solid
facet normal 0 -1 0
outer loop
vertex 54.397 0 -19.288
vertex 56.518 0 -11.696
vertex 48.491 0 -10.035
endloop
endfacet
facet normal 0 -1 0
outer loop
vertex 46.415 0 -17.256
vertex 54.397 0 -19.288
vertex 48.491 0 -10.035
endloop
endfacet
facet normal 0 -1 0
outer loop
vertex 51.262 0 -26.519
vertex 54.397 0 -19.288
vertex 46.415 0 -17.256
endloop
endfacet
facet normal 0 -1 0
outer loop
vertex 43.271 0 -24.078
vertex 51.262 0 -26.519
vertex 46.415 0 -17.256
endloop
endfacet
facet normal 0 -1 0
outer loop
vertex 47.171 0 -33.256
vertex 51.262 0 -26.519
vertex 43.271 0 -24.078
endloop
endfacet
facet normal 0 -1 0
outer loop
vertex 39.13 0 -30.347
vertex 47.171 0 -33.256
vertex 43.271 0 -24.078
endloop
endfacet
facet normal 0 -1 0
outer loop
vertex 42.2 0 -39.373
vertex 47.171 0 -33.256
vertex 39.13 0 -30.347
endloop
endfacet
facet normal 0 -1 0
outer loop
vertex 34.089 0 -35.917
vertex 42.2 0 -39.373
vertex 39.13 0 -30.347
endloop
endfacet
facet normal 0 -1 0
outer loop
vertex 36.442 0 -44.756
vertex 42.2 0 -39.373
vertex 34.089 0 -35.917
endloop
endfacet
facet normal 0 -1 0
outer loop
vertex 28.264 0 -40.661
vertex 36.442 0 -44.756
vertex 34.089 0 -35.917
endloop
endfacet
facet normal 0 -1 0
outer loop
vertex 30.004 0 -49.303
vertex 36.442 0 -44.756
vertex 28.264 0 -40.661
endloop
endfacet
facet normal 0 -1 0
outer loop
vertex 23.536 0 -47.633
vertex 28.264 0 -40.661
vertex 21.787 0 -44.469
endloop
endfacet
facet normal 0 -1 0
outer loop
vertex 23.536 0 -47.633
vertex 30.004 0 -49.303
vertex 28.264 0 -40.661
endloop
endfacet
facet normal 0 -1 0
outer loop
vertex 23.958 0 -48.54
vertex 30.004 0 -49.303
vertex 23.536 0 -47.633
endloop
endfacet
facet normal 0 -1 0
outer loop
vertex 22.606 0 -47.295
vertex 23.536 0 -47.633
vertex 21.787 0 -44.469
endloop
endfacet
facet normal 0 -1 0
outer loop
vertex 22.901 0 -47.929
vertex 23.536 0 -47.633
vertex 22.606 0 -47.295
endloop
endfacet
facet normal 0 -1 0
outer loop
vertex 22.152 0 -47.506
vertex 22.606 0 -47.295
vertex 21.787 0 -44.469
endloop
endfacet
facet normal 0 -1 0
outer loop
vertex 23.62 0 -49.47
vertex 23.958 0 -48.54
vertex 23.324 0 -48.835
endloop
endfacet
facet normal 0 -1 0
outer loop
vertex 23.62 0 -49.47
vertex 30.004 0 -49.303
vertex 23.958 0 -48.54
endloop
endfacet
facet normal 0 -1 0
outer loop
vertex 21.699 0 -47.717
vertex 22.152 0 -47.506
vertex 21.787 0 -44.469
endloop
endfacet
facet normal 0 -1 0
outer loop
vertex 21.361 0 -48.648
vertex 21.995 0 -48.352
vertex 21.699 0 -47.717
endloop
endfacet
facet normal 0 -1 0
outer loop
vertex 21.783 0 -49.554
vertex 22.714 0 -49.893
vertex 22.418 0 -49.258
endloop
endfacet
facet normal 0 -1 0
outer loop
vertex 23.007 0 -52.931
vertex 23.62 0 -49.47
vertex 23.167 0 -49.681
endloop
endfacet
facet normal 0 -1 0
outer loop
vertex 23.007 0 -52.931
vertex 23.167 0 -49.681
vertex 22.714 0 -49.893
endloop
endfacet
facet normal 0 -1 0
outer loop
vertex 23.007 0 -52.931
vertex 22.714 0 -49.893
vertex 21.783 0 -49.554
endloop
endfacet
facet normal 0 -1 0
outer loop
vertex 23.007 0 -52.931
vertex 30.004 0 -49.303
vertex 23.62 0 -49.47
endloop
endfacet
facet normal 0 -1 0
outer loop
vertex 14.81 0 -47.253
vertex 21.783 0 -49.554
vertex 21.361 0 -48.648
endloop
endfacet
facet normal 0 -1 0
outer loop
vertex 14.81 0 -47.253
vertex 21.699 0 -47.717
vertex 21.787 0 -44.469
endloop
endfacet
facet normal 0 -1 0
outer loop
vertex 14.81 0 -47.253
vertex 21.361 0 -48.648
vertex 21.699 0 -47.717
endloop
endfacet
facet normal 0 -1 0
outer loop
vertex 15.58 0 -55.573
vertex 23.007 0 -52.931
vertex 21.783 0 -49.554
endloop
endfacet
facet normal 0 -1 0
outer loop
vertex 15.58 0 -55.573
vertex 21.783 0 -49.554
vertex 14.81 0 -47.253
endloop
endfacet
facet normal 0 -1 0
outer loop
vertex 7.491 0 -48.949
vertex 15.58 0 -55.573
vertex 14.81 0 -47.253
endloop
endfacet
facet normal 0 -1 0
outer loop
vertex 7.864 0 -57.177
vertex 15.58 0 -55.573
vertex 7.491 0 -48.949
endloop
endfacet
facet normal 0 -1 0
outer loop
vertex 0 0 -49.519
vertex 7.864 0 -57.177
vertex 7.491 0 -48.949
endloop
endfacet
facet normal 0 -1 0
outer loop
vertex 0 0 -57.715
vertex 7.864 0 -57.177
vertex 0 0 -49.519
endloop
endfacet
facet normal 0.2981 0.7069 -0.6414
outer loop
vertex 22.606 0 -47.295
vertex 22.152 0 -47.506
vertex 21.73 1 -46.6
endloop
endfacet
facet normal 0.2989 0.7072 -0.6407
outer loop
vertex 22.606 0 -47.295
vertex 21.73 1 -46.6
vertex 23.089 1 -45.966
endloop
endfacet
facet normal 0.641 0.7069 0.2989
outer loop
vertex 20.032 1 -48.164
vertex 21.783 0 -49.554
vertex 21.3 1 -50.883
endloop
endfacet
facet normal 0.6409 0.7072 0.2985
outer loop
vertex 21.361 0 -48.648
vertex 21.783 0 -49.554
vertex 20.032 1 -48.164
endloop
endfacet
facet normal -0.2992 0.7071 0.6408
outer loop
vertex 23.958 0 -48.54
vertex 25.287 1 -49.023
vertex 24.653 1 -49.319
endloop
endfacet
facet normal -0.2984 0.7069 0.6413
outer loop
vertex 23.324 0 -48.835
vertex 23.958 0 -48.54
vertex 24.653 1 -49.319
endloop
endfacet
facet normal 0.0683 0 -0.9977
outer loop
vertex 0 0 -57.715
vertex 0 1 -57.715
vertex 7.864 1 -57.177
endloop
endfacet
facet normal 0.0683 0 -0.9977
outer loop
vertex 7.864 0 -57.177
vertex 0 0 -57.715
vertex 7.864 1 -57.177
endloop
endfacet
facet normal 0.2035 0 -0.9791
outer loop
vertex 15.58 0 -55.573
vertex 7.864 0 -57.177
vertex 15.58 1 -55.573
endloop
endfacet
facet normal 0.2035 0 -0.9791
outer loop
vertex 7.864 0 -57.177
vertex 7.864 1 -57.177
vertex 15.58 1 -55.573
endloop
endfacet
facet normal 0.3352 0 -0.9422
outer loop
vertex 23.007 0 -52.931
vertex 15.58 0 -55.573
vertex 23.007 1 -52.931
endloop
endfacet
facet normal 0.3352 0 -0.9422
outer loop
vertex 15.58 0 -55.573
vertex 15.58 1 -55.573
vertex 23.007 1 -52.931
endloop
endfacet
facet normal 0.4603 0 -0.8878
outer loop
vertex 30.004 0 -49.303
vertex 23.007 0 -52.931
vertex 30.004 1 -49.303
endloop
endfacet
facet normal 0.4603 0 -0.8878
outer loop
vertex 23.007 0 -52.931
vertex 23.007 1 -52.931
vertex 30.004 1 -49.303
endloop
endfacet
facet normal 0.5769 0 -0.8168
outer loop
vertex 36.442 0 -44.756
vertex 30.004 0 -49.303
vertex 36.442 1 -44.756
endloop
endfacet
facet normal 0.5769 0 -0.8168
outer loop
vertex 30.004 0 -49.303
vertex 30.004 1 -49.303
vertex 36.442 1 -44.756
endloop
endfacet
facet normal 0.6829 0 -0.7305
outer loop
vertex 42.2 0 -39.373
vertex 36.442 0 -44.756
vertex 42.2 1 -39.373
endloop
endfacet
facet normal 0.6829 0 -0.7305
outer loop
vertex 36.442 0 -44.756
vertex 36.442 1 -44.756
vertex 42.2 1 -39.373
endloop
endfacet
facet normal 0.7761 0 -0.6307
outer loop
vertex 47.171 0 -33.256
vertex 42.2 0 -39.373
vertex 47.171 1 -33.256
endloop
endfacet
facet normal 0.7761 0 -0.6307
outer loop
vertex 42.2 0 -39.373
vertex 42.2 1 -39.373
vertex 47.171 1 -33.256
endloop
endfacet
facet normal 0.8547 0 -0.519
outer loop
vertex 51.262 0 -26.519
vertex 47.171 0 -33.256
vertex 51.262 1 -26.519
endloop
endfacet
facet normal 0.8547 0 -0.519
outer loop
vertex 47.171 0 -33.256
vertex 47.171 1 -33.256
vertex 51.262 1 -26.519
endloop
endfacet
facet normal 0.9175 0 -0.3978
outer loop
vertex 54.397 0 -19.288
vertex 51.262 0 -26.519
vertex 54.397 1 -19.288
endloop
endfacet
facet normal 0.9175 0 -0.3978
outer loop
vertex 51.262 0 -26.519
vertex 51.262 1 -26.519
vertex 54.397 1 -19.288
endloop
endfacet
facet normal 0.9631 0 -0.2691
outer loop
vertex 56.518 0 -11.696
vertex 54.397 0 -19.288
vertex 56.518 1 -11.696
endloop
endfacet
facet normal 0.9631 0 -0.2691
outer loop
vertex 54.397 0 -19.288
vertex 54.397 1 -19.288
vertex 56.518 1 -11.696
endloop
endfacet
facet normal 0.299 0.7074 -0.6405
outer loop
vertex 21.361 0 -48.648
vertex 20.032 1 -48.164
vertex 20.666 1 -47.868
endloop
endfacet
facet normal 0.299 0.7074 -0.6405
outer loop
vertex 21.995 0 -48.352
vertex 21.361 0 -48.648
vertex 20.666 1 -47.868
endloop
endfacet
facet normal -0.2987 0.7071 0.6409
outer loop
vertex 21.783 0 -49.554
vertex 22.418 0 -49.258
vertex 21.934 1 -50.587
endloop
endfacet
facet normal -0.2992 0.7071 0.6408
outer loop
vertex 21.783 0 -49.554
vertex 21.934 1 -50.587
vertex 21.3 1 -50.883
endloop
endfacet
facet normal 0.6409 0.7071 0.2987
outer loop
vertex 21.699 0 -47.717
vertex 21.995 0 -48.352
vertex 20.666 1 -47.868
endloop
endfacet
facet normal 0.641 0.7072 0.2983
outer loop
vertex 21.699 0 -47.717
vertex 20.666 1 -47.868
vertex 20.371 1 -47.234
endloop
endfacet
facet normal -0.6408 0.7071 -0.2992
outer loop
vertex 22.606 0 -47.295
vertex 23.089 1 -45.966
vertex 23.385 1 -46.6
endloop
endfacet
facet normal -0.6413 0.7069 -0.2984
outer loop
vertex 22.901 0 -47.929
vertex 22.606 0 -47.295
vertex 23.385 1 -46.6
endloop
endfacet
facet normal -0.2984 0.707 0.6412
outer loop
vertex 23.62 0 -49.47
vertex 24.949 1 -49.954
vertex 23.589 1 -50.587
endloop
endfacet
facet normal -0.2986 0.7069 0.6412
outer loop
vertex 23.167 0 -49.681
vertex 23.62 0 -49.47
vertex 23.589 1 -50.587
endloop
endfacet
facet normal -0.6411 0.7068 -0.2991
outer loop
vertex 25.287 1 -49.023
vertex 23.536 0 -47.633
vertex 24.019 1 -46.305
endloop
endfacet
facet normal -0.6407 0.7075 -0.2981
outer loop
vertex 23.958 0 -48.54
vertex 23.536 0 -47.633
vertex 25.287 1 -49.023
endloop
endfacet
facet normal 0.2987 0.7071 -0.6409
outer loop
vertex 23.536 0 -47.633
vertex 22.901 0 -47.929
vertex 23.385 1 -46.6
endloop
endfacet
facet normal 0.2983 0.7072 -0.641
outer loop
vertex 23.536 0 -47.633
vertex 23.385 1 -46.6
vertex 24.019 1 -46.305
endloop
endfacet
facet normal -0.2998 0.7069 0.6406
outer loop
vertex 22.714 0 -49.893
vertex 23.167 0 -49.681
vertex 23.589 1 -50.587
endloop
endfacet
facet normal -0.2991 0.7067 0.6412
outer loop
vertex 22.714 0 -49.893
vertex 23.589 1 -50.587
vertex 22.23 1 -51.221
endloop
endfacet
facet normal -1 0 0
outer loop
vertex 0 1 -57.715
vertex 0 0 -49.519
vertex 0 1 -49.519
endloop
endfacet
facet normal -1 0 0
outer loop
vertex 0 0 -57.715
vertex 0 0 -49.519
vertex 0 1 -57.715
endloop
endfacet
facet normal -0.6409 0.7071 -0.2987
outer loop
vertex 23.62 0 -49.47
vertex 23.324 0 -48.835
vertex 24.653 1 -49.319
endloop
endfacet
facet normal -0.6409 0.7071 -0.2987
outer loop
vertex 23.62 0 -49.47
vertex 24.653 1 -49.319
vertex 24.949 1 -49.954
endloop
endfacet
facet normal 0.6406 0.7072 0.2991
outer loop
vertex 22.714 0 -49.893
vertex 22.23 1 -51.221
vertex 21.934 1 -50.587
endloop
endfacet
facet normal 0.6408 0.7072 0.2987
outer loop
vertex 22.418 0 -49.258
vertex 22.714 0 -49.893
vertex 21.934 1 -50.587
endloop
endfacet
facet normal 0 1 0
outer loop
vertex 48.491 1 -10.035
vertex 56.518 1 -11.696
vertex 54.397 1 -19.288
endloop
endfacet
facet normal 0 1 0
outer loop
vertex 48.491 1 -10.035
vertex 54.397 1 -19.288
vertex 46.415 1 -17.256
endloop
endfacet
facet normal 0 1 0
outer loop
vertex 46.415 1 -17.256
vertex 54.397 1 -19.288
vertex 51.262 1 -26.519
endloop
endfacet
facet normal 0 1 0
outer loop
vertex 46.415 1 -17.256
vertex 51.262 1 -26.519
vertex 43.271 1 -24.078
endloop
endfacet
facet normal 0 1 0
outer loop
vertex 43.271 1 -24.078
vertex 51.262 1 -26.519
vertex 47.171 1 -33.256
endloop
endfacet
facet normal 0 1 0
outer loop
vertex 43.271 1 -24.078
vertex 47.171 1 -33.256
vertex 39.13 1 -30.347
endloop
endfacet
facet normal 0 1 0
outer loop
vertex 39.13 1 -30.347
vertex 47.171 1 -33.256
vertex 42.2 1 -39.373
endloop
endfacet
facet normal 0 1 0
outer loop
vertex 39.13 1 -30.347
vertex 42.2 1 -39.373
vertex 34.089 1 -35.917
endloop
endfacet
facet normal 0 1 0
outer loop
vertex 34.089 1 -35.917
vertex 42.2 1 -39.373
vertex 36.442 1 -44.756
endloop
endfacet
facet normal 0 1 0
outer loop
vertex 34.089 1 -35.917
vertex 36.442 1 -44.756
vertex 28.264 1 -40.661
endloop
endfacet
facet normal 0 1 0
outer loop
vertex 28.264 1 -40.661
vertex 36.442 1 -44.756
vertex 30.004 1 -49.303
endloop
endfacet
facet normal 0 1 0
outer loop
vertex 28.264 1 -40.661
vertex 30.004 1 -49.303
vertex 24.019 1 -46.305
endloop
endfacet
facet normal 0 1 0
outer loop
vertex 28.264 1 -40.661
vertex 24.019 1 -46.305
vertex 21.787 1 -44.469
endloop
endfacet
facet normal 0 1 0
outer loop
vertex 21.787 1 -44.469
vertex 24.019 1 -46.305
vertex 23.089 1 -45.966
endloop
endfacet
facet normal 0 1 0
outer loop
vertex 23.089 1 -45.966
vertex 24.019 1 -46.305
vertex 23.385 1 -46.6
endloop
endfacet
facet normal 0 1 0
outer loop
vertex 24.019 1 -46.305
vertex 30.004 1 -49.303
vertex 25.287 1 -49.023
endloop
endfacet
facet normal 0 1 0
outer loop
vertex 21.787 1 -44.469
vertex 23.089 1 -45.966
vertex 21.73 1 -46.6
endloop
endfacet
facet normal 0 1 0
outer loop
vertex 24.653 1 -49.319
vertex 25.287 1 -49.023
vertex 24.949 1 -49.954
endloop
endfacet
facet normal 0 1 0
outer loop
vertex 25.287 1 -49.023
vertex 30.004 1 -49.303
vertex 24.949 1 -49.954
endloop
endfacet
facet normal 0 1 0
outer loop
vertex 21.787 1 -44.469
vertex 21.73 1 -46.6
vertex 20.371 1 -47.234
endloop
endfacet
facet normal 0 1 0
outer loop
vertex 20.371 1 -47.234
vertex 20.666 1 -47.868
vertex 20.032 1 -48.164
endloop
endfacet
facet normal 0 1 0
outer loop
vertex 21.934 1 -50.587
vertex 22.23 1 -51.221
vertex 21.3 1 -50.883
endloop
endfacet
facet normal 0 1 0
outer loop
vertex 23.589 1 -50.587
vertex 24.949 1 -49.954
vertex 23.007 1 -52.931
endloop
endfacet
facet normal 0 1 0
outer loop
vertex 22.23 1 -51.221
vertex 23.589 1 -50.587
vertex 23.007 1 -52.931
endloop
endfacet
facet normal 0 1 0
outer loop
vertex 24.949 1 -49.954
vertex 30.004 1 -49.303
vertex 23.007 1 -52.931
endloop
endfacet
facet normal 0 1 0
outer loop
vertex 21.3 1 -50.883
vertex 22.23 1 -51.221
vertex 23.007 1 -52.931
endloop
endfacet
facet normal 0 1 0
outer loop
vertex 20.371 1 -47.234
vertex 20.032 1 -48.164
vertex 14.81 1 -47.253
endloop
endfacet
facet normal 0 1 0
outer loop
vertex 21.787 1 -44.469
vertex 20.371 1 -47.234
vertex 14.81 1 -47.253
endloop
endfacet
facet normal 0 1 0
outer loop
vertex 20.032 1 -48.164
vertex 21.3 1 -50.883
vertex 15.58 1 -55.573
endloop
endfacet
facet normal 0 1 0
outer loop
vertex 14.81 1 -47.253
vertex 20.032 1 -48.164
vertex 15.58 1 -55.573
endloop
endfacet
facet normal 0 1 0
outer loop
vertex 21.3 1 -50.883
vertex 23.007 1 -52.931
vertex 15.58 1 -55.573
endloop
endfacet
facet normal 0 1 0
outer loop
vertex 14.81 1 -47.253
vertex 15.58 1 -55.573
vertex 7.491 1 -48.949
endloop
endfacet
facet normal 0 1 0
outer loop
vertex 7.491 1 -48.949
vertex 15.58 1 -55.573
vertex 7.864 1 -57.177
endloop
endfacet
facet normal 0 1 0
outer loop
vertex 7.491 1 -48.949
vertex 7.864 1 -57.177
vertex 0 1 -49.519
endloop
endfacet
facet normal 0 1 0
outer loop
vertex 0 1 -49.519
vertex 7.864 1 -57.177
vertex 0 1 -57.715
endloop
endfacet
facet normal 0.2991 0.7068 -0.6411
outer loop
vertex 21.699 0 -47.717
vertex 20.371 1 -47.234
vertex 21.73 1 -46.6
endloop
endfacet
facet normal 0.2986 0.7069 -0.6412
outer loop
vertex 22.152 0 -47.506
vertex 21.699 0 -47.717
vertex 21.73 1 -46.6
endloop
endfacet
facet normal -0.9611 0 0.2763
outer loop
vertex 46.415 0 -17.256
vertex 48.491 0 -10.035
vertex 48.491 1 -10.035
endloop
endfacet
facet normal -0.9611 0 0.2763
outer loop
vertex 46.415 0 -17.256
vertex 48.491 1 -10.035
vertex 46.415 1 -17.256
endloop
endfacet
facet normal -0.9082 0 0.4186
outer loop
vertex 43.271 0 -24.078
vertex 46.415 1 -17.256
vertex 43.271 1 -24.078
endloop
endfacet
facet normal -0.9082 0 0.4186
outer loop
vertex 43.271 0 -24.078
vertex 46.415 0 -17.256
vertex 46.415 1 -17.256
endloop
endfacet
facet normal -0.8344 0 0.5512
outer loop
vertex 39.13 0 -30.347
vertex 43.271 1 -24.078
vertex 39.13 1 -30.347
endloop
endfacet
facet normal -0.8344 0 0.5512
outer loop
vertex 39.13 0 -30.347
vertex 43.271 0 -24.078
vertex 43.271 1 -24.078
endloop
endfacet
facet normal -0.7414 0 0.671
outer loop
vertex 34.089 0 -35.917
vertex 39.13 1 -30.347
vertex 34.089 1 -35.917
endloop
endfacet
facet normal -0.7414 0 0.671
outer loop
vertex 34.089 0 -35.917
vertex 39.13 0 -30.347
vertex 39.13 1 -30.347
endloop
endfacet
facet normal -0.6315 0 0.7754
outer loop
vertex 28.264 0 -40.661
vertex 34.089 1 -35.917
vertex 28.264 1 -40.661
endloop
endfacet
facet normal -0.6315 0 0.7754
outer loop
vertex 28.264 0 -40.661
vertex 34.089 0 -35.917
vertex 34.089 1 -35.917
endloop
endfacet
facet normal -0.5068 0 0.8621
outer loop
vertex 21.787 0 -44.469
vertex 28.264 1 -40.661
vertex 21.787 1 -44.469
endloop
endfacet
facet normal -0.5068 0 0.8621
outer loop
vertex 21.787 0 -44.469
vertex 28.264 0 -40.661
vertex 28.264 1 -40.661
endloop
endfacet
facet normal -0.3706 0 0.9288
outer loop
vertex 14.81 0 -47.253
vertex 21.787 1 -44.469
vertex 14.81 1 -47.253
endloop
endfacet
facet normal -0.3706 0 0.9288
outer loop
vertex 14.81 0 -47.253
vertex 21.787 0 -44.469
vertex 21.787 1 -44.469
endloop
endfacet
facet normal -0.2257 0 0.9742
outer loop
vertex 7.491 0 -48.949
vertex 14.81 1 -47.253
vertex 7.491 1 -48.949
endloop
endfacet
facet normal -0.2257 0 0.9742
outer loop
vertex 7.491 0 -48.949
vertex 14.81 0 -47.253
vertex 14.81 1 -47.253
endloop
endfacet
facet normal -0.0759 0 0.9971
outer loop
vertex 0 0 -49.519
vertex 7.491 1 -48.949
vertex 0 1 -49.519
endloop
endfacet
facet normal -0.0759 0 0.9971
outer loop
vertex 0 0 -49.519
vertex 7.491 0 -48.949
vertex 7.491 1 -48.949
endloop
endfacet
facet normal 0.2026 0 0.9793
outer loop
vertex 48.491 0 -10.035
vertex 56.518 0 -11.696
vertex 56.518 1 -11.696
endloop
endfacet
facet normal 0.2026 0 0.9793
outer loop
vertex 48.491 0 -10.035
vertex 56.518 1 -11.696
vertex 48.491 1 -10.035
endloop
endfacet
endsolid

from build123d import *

# Parameters (mm, degrees)
BOSS_EXTRUDE1_DEPTH = 1
CUT_EXTRUDE2_DEPTH  = 84.653220646
CUT_EXTRUDE1_DEPTH  = 81.785527353
CHAMFER1_SIZE       = 1


with BuildPart() as part:
    # Sketch1 → Boss-Extrude1 (new body)
    with BuildSketch(Plane(origin=(0, 0, 0), x_dir=(1, 0, 0), z_dir=(0, 1, 0))):
        with BuildLine():
            Line((0, 49.519034561), (0, 59.764352058))
            ThreePointArc((0, 59.764352058), (37.735444373, 46.3445144), (58.524213344, 12.111739322))
            Line((58.524213344, 12.111739322), (48.491491054, 10.03544116))
            ThreePointArc((48.491491054, 10.03544116), (31.266511048, 38.399740504), (0, 49.519034561))
        make_face()
    extrude(amount=BOSS_EXTRUDE1_DEPTH)

    # Sketch3 → Cut-Extrude2 (cut, through all)
    with BuildSketch(Plane(origin=(0, 1, 0), x_dir=(1, 0, 0), z_dir=(0, 1, 0))):
        with BuildLine():
            ThreePointArc((0, 57.715288559), (36.441657708, 44.75555962), (56.517668886, 11.69647969))
            Line((56.517668886, 11.69647969), (58.524213344, 12.111739322))
            ThreePointArc((58.524213344, 12.111739322), (37.735444373, 46.3445144), (0, 59.764352058))
            Line((0, 59.764352058), (0, 57.715288559))
        make_face()
    extrude(amount=-CUT_EXTRUDE2_DEPTH, mode=Mode.SUBTRACT)

    # Sketch2 → Cut-Extrude1 (cut, through all)
    with BuildSketch(Plane(origin=(0, 1, 0), x_dir=(1, 0, 0), z_dir=(0, 1, 0))):
        Polygon((23.166733532, 49.681220385), (22.870900749, 49.046804934), (23.324054642, 48.835495803), (23.619887426, 49.469911254), align=None)
        Polygon((22.417746855, 49.258114065), (22.870900749, 49.046804934), (23.166733532, 49.681220385), (22.713579639, 49.892529516), align=None)
        Polygon((22.206437724, 48.804960172), (22.659591618, 48.593651041), (22.870900749, 49.046804934), (22.417746855, 49.258114065), align=None)
        Polygon((21.360713143, 48.647639061), (21.995128594, 48.351806278), (22.206437724, 48.804960172), (22.417746855, 49.258114065), (21.783331404, 49.553946848), align=None)
        Polygon((21.995128594, 48.351806278), (22.448282487, 48.140497147), (22.659591618, 48.593651041), (22.206437724, 48.804960172), align=None)
        Polygon((21.69929581, 47.717390827), (22.152449704, 47.506081696), (22.448282487, 48.140497147), (21.995128594, 48.351806278), align=None)
        Polygon((22.448282487, 48.140497147), (22.152449704, 47.506081696), (22.605603597, 47.294772565), (22.901436381, 47.929188016), align=None)
        Polygon((22.659591618, 48.593651041), (22.448282487, 48.140497147), (22.901436381, 47.929188016), (23.112745512, 48.38234191), align=None)
        Polygon((23.112745512, 48.38234191), (22.901436381, 47.929188016), (23.535851832, 47.633355233), (23.958470093, 48.53966302), (23.324054642, 48.835495803), align=None)
        Polygon((22.870900749, 49.046804934), (22.659591618, 48.593651041), (23.112745512, 48.38234191), (23.324054642, 48.835495803), align=None)
    extrude(amount=-CUT_EXTRUDE1_DEPTH, mode=Mode.SUBTRACT)

    # Chamfer1
    chamfer1_edges = [part.edges().sort_by_distance(p)[0] for p in [
        (21.847212202, 1, -48.034598553),
        (22.152449704, 1, -47.506081696),
        (22.753519989, 1, -47.611980291),
        (23.218644106, 1, -47.781271625),
        (23.747160962, 1, -48.086509127),
        (23.641262368, 1, -48.687579412),
        (23.471971034, 1, -49.152703529),
        (23.166733532, 1, -49.681220385),
        (22.565663247, 1, -49.575321791),
        (22.10053913, 1, -49.406030457),
        (21.572022274, 1, -49.100792955),
        (21.677920868, 1, -48.49972267),
    ]]
    chamfer(chamfer1_edges, length=CHAMFER1_SIZE - 0.0001)  # a hair under: the kernel refuses the full size


solid = part.part
